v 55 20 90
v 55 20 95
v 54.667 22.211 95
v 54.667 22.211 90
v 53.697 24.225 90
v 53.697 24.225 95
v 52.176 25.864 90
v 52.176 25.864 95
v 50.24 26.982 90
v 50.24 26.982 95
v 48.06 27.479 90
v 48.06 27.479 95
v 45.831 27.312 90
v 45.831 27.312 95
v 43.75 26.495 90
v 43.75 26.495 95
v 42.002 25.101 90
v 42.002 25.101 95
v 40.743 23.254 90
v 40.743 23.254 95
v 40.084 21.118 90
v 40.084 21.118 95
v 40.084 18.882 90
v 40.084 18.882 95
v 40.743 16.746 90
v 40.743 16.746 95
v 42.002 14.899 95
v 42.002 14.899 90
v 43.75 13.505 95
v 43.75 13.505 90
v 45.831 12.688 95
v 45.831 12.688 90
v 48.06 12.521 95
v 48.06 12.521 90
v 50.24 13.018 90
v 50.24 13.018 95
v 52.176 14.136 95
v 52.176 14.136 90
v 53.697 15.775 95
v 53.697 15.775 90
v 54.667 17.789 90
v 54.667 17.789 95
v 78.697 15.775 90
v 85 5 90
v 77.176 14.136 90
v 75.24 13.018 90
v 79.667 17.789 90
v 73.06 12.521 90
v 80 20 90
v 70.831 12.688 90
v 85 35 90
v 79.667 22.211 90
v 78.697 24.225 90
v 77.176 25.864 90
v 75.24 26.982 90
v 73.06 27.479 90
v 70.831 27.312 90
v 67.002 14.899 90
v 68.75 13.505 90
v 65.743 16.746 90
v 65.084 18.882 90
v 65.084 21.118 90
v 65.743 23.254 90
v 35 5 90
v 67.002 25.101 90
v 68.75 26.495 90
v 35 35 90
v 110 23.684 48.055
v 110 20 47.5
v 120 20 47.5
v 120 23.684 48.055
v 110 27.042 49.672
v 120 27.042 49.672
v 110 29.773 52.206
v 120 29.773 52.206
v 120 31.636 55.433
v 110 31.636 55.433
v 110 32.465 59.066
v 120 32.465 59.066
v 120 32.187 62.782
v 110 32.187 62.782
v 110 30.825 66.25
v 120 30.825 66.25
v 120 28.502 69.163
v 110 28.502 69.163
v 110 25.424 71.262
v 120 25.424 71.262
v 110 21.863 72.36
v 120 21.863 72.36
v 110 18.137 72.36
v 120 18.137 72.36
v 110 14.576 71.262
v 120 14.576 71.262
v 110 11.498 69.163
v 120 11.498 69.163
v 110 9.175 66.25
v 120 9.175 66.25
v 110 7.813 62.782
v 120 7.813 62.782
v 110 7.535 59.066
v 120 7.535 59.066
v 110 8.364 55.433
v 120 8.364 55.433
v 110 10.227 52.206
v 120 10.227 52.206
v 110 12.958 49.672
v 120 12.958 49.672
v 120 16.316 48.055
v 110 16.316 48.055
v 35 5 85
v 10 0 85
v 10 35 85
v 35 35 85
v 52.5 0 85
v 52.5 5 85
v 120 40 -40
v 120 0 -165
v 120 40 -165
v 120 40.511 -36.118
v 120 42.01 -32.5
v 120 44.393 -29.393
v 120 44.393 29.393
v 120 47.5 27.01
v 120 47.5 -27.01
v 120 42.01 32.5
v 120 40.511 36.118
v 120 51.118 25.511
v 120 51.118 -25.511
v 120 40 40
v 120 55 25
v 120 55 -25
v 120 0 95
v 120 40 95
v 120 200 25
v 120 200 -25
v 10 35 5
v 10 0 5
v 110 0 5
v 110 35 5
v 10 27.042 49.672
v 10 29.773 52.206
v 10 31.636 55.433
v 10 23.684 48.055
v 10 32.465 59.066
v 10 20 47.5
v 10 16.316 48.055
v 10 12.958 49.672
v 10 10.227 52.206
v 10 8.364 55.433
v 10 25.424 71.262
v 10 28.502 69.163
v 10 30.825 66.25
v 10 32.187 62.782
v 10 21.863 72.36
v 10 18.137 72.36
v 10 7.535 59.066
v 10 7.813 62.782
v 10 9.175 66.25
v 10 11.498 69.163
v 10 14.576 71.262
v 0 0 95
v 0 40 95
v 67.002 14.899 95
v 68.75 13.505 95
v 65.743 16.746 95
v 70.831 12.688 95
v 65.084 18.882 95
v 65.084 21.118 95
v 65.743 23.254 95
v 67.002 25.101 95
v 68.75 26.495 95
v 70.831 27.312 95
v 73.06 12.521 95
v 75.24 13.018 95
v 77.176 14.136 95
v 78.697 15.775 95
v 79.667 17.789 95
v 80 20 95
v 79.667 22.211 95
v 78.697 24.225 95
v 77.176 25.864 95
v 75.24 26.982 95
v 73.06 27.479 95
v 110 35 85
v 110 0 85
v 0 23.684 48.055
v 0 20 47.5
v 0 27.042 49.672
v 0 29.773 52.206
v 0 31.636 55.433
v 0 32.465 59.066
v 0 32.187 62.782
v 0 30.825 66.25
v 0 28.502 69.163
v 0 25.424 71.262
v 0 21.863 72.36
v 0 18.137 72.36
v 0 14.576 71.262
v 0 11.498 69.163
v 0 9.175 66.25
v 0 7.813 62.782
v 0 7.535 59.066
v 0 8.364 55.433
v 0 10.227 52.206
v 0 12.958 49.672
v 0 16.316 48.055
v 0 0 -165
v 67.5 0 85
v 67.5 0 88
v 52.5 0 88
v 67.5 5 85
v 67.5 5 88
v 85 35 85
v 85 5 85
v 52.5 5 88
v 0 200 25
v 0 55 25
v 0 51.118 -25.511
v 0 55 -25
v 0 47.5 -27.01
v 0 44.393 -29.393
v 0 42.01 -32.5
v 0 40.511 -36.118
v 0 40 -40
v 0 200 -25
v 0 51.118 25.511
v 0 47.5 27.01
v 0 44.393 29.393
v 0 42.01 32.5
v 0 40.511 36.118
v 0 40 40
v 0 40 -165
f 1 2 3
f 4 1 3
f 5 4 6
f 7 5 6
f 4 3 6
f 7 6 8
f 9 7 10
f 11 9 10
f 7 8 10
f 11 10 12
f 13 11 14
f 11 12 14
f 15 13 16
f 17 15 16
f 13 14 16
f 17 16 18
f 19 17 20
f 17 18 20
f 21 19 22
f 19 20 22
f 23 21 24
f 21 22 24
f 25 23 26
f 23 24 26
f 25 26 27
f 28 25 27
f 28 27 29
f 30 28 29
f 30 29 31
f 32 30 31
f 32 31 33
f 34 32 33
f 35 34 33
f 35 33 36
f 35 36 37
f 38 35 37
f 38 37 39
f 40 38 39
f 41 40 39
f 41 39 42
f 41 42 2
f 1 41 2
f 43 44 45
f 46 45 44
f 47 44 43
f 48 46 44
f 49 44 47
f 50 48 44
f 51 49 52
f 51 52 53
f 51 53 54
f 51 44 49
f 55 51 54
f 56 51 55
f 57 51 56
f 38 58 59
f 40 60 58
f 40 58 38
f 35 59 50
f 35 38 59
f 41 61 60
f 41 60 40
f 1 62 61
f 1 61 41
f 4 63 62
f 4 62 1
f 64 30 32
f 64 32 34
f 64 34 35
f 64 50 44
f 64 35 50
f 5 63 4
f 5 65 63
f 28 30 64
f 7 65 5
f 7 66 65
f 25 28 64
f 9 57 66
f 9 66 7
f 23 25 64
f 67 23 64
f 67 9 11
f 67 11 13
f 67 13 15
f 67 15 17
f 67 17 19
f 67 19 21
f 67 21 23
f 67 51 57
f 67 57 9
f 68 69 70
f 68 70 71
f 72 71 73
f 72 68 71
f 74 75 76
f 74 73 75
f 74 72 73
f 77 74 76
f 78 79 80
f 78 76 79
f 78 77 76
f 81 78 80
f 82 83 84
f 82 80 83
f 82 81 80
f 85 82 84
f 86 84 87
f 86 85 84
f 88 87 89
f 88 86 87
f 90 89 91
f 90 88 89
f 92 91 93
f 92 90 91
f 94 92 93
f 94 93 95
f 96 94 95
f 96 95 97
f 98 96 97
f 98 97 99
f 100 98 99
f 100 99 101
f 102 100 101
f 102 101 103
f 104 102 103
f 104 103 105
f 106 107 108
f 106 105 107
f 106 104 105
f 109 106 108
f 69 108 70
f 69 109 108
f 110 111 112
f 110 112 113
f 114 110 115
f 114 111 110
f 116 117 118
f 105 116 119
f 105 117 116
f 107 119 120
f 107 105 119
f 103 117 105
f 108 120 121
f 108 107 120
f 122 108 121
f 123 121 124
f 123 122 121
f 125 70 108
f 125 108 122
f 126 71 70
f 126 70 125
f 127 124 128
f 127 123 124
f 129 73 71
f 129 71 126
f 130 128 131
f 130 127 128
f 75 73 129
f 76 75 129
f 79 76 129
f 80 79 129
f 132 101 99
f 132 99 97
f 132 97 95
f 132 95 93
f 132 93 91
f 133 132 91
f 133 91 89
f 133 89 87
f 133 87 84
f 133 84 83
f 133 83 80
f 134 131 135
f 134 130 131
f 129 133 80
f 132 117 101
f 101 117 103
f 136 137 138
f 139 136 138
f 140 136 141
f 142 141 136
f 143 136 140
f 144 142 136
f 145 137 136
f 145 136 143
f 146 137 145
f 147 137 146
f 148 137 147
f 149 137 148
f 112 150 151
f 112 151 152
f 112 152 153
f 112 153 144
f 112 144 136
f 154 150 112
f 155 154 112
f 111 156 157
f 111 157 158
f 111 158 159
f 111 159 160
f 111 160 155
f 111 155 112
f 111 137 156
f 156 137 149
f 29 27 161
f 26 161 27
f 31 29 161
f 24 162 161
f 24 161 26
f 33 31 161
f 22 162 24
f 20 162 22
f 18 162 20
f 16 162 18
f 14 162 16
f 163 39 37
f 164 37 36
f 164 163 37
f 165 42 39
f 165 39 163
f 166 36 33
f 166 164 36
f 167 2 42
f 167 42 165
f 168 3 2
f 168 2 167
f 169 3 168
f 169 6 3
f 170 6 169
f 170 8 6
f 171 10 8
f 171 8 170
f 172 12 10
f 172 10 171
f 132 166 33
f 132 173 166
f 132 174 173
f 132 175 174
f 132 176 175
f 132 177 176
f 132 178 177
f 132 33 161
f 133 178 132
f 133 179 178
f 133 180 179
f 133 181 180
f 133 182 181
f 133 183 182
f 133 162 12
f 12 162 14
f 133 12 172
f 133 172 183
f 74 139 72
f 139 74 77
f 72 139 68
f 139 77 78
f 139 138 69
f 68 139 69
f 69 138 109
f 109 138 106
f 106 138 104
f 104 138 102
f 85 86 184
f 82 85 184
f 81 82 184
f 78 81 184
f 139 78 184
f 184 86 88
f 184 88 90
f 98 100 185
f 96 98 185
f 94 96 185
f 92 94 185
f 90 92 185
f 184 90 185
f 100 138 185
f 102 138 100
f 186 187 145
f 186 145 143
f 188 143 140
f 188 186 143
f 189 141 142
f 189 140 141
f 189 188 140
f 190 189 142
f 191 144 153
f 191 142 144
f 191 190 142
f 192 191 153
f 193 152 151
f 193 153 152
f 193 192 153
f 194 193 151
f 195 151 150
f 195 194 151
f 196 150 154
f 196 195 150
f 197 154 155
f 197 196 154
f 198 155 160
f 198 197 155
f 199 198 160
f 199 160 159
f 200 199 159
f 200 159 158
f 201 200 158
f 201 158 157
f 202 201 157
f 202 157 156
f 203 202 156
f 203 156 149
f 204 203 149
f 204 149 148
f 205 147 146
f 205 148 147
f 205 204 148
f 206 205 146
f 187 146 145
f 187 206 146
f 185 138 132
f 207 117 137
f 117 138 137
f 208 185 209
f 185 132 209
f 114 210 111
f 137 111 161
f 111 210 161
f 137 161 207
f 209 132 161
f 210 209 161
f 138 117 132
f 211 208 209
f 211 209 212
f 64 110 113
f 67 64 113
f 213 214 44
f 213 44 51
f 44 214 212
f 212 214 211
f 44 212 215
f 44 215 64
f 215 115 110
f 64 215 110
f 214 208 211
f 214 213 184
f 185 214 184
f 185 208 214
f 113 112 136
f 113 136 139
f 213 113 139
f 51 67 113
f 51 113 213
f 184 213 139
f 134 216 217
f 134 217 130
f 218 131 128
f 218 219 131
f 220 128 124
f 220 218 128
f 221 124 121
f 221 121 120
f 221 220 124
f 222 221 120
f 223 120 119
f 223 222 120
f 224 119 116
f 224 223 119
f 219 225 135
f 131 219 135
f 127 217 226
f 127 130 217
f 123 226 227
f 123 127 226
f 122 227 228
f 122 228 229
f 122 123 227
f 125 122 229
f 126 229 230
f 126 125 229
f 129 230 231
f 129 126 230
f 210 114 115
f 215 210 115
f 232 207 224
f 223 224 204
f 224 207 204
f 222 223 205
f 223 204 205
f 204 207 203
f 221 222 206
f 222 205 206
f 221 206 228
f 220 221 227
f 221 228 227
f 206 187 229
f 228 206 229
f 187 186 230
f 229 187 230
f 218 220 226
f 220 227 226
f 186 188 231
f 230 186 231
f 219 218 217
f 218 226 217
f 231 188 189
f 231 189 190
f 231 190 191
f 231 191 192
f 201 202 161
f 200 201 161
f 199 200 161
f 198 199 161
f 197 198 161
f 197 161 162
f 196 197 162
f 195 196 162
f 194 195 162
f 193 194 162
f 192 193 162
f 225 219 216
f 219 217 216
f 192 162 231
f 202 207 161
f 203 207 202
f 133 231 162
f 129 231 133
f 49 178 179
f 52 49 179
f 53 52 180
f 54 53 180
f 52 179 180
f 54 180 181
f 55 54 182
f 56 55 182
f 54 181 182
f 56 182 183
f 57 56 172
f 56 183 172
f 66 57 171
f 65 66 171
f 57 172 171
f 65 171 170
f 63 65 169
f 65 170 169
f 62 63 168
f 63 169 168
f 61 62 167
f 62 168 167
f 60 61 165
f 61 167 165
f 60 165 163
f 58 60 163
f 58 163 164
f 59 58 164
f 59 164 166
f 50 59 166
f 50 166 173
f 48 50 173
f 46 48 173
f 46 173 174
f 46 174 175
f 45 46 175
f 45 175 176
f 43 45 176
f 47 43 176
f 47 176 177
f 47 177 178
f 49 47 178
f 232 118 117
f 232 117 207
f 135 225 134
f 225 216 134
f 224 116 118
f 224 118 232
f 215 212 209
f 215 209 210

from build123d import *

# Parameters (mm, degrees)
ESQUISSE1_W                  = 120
ESQUISSE1_H                  = 200
BOSS_EXTRU_2_DEPTH           = 25
ESQUISSE3_W                  = 120
ESQUISSE3_H                  = 40
BOSS_EXTRU_3_DEPTH           = 70
CONG_1_R                     = 15
ESQUISSE4_W                  = 120
ESQUISSE4_H                  = 40
BOSS_EXTRU_4_DEPTH           = 140
CONG_2_R                     = 15
ESQUISSE5_W                  = 50
ESQUISSE5_H                  = 30
BOSS_EXTRU_9_DEPTH           = 7.5
ESQUISSE7_W                  = 100
ESQUISSE7_H                  = 80
ENL_V_MAT_EXTRU_1_DEPTH      = 35
ENL_V_MAT_EXTRU_7_REACH      = 351.285
ESQUISSE8_R                  = 7.5
ESQUISSE12_W                 = 50
ESQUISSE12_H                 = 30
ENL_V_MAT_EXTRU_8_DEPTH      = 5
ENL_V_MAT_EXTRU_9_DEPTH      = 286.700892543
ENL_V_MAT_EXTRU_9_DEPTH_BACK = 286.700892543
ESQUISSE13_R                 = 12.5
ESQUISSE14_W                 = 15
ESQUISSE14_H                 = 5
ENL_V_MAT_EXTRU_10_DEPTH     = 3


with BuildPart() as part:
    # Esquisse1 → Boss.-Extru.2 (new, symmetric)
    with BuildSketch(Plane.XY):
        with Locations((60, 100)):
            Rectangle(ESQUISSE1_W, ESQUISSE1_H)
    extrude(amount=BOSS_EXTRU_2_DEPTH, both=True)

    # Esquisse3 → Boss.-Extru.3 (add)
    with BuildSketch(Plane.XY.offset(25)):
        with Locations((60, 20)):
            Rectangle(ESQUISSE3_W, ESQUISSE3_H)
    extrude(amount=BOSS_EXTRU_3_DEPTH)

    # Congé1
    cong_1_edges = [part.edges().sort_by_distance(p)[0] for p in [
        (60, 40, 25),
    ]]
    fillet(cong_1_edges, radius=CONG_1_R)

    # Esquisse4 → Boss.-Extru.4 (add)
    with BuildSketch(Plane(origin=(0, 0, -25), x_dir=(-1, 0, 0), z_dir=(0, 0, -1))):
        with Locations((-60, 20)):
            Rectangle(ESQUISSE4_W, ESQUISSE4_H)
    extrude(amount=BOSS_EXTRU_4_DEPTH)

    # Congé2
    cong_2_edges = [part.edges().sort_by_distance(p)[0] for p in [
        (60, 40, -25),
    ]]
    fillet(cong_2_edges, radius=CONG_2_R)

    # Esquisse5 → Boss.-Extru.9 (add)
    with BuildSketch(Plane.XY.offset(95)):
        with Locations((60, 20)):
            Rectangle(ESQUISSE5_W, ESQUISSE5_H)
    extrude(amount=-BOSS_EXTRU_9_DEPTH)

    # Esquisse7 → Enlèv. mat.-Extru.1 (cut)
    with BuildSketch(Plane.XZ):
        with Locations((60, 45)):
            Rectangle(ESQUISSE7_W, ESQUISSE7_H)
    extrude(amount=-ENL_V_MAT_EXTRU_1_DEPTH, mode=Mode.SUBTRACT)

    # Esquisse8 → Enlèv. mat.-Extru.7 (cut, up to next)
    with BuildSketch(Plane.XY.offset(95), mode=Mode.PRIVATE) as enl_v_mat_extru_7_sk1:
        with Locations((47.5, 20)):
            Circle(ESQUISSE8_R)
    enl_v_mat_extru_7_tool1 = extrude(enl_v_mat_extru_7_sk1.sketch, amount=-ENL_V_MAT_EXTRU_7_REACH, mode=Mode.PRIVATE) & part.part
    # Esquisse8 → Enlèv. mat.-Extru.7 (cut, up to next)
    with BuildSketch(Plane.XY.offset(95), mode=Mode.PRIVATE) as enl_v_mat_extru_7_sk2:
        with Locations((72.5, 20)):
            Circle(ESQUISSE8_R)
    enl_v_mat_extru_7_tool2 = extrude(enl_v_mat_extru_7_sk2.sketch, amount=-ENL_V_MAT_EXTRU_7_REACH, mode=Mode.PRIVATE) & part.part
    add(enl_v_mat_extru_7_tool1.solids().sort_by_distance((47.5, 20, 95))[0], mode=Mode.SUBTRACT)
    add(enl_v_mat_extru_7_tool2.solids().sort_by_distance((72.5, 20, 95))[0], mode=Mode.SUBTRACT)

    # Esquisse12 → Enlèv. mat.-Extru.8 (cut)
    with BuildSketch(Plane(origin=(0, 0, 85), x_dir=(-1, 0, 0), z_dir=(0, 0, -1))):
        with Locations((-60, 20)):
            Rectangle(ESQUISSE12_W, ESQUISSE12_H)
    extrude(amount=-ENL_V_MAT_EXTRU_8_DEPTH, mode=Mode.SUBTRACT)

    # Esquisse13 → Enlèv. mat.-Extru.9 (cut, two sides: drawn at the far end of the back side and taken through both)
    with BuildSketch(Plane(origin=(120, 0, 0), x_dir=(0, 0, -1), z_dir=(1, 0, 0)).offset(-ENL_V_MAT_EXTRU_9_DEPTH_BACK)):
        with Locations((-60, 20)):
            Circle(ESQUISSE13_R)
    extrude(amount=ENL_V_MAT_EXTRU_9_DEPTH + ENL_V_MAT_EXTRU_9_DEPTH_BACK, mode=Mode.SUBTRACT)

    # Esquisse14 → Enlèv. mat.-Extru.10 (cut)
    with BuildSketch(Plane(origin=(0, 0, 85), x_dir=(-1, 0, 0), z_dir=(0, 0, -1))):
        with Locations((-60, 2.5)):
            Rectangle(ESQUISSE14_W, ESQUISSE14_H)
    extrude(amount=-ENL_V_MAT_EXTRU_10_DEPTH, mode=Mode.SUBTRACT)


solid = part.part
